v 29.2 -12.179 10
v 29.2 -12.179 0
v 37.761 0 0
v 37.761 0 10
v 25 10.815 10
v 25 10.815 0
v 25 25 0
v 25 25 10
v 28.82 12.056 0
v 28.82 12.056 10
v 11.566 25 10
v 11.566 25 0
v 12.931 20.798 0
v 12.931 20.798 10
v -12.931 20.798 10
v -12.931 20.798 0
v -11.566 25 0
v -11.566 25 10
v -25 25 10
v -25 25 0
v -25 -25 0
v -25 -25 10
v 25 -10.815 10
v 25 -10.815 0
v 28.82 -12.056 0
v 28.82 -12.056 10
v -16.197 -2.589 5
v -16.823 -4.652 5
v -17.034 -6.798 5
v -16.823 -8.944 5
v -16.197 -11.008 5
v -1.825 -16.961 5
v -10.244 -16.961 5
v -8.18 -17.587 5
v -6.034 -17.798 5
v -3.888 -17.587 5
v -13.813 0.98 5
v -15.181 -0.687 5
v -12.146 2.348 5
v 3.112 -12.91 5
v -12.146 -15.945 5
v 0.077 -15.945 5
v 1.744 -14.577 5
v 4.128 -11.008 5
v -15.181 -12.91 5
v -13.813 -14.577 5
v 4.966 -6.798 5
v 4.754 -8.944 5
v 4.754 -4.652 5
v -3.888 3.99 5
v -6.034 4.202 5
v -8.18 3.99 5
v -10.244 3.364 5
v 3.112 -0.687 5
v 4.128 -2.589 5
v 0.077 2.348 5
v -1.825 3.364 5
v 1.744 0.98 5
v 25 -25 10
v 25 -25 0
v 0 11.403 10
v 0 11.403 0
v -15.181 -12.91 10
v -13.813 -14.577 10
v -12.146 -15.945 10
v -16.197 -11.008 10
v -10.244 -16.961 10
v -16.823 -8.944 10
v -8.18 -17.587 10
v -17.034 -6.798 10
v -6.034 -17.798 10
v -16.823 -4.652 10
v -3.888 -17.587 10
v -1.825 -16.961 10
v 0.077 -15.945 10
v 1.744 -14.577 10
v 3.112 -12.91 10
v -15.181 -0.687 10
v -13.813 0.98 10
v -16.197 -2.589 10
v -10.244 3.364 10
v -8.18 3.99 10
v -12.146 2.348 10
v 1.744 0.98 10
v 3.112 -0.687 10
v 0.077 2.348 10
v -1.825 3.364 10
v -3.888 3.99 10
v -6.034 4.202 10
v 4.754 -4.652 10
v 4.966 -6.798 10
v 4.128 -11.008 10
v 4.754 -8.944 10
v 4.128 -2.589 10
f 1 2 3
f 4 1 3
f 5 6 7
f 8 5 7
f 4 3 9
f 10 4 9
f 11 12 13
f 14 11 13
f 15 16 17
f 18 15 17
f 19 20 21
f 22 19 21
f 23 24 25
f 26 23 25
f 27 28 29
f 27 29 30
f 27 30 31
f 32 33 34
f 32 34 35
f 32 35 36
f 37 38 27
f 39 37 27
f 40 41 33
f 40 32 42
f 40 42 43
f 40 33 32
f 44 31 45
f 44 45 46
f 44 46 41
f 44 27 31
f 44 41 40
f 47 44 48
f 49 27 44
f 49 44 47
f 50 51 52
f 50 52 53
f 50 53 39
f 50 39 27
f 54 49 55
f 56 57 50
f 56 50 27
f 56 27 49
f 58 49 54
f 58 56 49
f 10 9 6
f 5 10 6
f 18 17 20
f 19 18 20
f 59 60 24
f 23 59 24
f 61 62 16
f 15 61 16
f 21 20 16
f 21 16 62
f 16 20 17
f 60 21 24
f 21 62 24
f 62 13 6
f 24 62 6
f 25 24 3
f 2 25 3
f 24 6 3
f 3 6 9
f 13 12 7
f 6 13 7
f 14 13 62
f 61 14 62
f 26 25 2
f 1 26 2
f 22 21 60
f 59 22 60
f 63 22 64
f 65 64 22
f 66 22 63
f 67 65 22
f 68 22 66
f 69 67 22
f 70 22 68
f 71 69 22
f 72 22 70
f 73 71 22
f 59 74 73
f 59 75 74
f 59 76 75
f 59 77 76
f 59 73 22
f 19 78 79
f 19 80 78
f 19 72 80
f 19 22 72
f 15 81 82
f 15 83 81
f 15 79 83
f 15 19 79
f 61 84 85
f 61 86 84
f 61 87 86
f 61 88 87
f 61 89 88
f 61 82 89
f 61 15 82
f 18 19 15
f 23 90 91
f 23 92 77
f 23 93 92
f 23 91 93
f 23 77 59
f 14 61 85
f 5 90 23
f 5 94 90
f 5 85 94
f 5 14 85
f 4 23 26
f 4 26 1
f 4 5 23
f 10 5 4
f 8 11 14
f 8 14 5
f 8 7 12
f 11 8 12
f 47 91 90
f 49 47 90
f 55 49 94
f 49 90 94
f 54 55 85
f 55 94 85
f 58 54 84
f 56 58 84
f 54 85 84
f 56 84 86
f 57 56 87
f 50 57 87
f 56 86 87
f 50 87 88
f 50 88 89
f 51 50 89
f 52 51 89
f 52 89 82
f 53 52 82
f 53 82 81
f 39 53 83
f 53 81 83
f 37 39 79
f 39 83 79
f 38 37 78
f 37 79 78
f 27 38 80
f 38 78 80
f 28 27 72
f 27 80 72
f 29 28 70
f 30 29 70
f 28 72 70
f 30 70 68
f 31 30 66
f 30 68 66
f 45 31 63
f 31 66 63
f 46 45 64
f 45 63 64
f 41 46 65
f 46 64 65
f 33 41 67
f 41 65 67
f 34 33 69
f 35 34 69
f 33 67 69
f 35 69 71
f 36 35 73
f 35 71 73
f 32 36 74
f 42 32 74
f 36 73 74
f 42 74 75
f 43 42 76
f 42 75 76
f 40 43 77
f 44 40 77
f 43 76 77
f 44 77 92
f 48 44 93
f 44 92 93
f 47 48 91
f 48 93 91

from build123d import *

# Parameters (mm, degrees)
F1_DEPTH = 10
F2_R     = 11
F3_DEPTH = 5


# Not quite as in the source:
# - a feature names something its author has since deleted; it is built from what else it names


with BuildPart() as f1:
    # F0 (on Top) → F1 (new body)
    with BuildSketch(Plane.XY):
        Polygon((-25, -25), (25, -25), (25, -10.8146222424), (25, -10.5146222424), (15, -7.2654252801), (15, 7.2654252801), (25, 10.5146222424), (25, 10.8146222424), (25, 25), (11.5660844666, 25), (12.9312755504, 20.7983738762), (0, 11.4032522475), (-12.9312755504, 20.7983738762), (-11.5660844666, 25), (-25, 25), align=None)
        Polygon((25, 10.5146222424), (25, -10.5146222424), (28.8196601125, -11.7557050458), (37.360679775, 0), (28.8196601125, 11.7557050458), align=None)
        Polygon((15, -7.2654252801), (25, -10.5146222424), (25, 10.5146222424), (15, 7.2654252801), align=None)
        Polygon((25, 10.8146222424), (25, 10.5146222424), (28.8196601125, 11.7557050458), (37.360679775, 0), (37.760679775, 0), (28.8196601125, 12.0557050458), align=None)
        Polygon((25, -10.5146222424), (25, -10.8146222424), (28.8196601125, -12.0557050458), (29.200082719, -12.1793118436), (37.760679775, 0), (37.360679775, 0), (28.8196601125, -11.7557050458), align=None)
    extrude(amount=F1_DEPTH)

    # F2 (on face) → F3 (cut)
    with BuildSketch(Plane.XY.offset(10)):
        with Locations((-6.0343622248, -6.7983738762)):
            Circle(F2_R)
    extrude(amount=-F3_DEPTH, mode=Mode.SUBTRACT)


solid = f1.part
